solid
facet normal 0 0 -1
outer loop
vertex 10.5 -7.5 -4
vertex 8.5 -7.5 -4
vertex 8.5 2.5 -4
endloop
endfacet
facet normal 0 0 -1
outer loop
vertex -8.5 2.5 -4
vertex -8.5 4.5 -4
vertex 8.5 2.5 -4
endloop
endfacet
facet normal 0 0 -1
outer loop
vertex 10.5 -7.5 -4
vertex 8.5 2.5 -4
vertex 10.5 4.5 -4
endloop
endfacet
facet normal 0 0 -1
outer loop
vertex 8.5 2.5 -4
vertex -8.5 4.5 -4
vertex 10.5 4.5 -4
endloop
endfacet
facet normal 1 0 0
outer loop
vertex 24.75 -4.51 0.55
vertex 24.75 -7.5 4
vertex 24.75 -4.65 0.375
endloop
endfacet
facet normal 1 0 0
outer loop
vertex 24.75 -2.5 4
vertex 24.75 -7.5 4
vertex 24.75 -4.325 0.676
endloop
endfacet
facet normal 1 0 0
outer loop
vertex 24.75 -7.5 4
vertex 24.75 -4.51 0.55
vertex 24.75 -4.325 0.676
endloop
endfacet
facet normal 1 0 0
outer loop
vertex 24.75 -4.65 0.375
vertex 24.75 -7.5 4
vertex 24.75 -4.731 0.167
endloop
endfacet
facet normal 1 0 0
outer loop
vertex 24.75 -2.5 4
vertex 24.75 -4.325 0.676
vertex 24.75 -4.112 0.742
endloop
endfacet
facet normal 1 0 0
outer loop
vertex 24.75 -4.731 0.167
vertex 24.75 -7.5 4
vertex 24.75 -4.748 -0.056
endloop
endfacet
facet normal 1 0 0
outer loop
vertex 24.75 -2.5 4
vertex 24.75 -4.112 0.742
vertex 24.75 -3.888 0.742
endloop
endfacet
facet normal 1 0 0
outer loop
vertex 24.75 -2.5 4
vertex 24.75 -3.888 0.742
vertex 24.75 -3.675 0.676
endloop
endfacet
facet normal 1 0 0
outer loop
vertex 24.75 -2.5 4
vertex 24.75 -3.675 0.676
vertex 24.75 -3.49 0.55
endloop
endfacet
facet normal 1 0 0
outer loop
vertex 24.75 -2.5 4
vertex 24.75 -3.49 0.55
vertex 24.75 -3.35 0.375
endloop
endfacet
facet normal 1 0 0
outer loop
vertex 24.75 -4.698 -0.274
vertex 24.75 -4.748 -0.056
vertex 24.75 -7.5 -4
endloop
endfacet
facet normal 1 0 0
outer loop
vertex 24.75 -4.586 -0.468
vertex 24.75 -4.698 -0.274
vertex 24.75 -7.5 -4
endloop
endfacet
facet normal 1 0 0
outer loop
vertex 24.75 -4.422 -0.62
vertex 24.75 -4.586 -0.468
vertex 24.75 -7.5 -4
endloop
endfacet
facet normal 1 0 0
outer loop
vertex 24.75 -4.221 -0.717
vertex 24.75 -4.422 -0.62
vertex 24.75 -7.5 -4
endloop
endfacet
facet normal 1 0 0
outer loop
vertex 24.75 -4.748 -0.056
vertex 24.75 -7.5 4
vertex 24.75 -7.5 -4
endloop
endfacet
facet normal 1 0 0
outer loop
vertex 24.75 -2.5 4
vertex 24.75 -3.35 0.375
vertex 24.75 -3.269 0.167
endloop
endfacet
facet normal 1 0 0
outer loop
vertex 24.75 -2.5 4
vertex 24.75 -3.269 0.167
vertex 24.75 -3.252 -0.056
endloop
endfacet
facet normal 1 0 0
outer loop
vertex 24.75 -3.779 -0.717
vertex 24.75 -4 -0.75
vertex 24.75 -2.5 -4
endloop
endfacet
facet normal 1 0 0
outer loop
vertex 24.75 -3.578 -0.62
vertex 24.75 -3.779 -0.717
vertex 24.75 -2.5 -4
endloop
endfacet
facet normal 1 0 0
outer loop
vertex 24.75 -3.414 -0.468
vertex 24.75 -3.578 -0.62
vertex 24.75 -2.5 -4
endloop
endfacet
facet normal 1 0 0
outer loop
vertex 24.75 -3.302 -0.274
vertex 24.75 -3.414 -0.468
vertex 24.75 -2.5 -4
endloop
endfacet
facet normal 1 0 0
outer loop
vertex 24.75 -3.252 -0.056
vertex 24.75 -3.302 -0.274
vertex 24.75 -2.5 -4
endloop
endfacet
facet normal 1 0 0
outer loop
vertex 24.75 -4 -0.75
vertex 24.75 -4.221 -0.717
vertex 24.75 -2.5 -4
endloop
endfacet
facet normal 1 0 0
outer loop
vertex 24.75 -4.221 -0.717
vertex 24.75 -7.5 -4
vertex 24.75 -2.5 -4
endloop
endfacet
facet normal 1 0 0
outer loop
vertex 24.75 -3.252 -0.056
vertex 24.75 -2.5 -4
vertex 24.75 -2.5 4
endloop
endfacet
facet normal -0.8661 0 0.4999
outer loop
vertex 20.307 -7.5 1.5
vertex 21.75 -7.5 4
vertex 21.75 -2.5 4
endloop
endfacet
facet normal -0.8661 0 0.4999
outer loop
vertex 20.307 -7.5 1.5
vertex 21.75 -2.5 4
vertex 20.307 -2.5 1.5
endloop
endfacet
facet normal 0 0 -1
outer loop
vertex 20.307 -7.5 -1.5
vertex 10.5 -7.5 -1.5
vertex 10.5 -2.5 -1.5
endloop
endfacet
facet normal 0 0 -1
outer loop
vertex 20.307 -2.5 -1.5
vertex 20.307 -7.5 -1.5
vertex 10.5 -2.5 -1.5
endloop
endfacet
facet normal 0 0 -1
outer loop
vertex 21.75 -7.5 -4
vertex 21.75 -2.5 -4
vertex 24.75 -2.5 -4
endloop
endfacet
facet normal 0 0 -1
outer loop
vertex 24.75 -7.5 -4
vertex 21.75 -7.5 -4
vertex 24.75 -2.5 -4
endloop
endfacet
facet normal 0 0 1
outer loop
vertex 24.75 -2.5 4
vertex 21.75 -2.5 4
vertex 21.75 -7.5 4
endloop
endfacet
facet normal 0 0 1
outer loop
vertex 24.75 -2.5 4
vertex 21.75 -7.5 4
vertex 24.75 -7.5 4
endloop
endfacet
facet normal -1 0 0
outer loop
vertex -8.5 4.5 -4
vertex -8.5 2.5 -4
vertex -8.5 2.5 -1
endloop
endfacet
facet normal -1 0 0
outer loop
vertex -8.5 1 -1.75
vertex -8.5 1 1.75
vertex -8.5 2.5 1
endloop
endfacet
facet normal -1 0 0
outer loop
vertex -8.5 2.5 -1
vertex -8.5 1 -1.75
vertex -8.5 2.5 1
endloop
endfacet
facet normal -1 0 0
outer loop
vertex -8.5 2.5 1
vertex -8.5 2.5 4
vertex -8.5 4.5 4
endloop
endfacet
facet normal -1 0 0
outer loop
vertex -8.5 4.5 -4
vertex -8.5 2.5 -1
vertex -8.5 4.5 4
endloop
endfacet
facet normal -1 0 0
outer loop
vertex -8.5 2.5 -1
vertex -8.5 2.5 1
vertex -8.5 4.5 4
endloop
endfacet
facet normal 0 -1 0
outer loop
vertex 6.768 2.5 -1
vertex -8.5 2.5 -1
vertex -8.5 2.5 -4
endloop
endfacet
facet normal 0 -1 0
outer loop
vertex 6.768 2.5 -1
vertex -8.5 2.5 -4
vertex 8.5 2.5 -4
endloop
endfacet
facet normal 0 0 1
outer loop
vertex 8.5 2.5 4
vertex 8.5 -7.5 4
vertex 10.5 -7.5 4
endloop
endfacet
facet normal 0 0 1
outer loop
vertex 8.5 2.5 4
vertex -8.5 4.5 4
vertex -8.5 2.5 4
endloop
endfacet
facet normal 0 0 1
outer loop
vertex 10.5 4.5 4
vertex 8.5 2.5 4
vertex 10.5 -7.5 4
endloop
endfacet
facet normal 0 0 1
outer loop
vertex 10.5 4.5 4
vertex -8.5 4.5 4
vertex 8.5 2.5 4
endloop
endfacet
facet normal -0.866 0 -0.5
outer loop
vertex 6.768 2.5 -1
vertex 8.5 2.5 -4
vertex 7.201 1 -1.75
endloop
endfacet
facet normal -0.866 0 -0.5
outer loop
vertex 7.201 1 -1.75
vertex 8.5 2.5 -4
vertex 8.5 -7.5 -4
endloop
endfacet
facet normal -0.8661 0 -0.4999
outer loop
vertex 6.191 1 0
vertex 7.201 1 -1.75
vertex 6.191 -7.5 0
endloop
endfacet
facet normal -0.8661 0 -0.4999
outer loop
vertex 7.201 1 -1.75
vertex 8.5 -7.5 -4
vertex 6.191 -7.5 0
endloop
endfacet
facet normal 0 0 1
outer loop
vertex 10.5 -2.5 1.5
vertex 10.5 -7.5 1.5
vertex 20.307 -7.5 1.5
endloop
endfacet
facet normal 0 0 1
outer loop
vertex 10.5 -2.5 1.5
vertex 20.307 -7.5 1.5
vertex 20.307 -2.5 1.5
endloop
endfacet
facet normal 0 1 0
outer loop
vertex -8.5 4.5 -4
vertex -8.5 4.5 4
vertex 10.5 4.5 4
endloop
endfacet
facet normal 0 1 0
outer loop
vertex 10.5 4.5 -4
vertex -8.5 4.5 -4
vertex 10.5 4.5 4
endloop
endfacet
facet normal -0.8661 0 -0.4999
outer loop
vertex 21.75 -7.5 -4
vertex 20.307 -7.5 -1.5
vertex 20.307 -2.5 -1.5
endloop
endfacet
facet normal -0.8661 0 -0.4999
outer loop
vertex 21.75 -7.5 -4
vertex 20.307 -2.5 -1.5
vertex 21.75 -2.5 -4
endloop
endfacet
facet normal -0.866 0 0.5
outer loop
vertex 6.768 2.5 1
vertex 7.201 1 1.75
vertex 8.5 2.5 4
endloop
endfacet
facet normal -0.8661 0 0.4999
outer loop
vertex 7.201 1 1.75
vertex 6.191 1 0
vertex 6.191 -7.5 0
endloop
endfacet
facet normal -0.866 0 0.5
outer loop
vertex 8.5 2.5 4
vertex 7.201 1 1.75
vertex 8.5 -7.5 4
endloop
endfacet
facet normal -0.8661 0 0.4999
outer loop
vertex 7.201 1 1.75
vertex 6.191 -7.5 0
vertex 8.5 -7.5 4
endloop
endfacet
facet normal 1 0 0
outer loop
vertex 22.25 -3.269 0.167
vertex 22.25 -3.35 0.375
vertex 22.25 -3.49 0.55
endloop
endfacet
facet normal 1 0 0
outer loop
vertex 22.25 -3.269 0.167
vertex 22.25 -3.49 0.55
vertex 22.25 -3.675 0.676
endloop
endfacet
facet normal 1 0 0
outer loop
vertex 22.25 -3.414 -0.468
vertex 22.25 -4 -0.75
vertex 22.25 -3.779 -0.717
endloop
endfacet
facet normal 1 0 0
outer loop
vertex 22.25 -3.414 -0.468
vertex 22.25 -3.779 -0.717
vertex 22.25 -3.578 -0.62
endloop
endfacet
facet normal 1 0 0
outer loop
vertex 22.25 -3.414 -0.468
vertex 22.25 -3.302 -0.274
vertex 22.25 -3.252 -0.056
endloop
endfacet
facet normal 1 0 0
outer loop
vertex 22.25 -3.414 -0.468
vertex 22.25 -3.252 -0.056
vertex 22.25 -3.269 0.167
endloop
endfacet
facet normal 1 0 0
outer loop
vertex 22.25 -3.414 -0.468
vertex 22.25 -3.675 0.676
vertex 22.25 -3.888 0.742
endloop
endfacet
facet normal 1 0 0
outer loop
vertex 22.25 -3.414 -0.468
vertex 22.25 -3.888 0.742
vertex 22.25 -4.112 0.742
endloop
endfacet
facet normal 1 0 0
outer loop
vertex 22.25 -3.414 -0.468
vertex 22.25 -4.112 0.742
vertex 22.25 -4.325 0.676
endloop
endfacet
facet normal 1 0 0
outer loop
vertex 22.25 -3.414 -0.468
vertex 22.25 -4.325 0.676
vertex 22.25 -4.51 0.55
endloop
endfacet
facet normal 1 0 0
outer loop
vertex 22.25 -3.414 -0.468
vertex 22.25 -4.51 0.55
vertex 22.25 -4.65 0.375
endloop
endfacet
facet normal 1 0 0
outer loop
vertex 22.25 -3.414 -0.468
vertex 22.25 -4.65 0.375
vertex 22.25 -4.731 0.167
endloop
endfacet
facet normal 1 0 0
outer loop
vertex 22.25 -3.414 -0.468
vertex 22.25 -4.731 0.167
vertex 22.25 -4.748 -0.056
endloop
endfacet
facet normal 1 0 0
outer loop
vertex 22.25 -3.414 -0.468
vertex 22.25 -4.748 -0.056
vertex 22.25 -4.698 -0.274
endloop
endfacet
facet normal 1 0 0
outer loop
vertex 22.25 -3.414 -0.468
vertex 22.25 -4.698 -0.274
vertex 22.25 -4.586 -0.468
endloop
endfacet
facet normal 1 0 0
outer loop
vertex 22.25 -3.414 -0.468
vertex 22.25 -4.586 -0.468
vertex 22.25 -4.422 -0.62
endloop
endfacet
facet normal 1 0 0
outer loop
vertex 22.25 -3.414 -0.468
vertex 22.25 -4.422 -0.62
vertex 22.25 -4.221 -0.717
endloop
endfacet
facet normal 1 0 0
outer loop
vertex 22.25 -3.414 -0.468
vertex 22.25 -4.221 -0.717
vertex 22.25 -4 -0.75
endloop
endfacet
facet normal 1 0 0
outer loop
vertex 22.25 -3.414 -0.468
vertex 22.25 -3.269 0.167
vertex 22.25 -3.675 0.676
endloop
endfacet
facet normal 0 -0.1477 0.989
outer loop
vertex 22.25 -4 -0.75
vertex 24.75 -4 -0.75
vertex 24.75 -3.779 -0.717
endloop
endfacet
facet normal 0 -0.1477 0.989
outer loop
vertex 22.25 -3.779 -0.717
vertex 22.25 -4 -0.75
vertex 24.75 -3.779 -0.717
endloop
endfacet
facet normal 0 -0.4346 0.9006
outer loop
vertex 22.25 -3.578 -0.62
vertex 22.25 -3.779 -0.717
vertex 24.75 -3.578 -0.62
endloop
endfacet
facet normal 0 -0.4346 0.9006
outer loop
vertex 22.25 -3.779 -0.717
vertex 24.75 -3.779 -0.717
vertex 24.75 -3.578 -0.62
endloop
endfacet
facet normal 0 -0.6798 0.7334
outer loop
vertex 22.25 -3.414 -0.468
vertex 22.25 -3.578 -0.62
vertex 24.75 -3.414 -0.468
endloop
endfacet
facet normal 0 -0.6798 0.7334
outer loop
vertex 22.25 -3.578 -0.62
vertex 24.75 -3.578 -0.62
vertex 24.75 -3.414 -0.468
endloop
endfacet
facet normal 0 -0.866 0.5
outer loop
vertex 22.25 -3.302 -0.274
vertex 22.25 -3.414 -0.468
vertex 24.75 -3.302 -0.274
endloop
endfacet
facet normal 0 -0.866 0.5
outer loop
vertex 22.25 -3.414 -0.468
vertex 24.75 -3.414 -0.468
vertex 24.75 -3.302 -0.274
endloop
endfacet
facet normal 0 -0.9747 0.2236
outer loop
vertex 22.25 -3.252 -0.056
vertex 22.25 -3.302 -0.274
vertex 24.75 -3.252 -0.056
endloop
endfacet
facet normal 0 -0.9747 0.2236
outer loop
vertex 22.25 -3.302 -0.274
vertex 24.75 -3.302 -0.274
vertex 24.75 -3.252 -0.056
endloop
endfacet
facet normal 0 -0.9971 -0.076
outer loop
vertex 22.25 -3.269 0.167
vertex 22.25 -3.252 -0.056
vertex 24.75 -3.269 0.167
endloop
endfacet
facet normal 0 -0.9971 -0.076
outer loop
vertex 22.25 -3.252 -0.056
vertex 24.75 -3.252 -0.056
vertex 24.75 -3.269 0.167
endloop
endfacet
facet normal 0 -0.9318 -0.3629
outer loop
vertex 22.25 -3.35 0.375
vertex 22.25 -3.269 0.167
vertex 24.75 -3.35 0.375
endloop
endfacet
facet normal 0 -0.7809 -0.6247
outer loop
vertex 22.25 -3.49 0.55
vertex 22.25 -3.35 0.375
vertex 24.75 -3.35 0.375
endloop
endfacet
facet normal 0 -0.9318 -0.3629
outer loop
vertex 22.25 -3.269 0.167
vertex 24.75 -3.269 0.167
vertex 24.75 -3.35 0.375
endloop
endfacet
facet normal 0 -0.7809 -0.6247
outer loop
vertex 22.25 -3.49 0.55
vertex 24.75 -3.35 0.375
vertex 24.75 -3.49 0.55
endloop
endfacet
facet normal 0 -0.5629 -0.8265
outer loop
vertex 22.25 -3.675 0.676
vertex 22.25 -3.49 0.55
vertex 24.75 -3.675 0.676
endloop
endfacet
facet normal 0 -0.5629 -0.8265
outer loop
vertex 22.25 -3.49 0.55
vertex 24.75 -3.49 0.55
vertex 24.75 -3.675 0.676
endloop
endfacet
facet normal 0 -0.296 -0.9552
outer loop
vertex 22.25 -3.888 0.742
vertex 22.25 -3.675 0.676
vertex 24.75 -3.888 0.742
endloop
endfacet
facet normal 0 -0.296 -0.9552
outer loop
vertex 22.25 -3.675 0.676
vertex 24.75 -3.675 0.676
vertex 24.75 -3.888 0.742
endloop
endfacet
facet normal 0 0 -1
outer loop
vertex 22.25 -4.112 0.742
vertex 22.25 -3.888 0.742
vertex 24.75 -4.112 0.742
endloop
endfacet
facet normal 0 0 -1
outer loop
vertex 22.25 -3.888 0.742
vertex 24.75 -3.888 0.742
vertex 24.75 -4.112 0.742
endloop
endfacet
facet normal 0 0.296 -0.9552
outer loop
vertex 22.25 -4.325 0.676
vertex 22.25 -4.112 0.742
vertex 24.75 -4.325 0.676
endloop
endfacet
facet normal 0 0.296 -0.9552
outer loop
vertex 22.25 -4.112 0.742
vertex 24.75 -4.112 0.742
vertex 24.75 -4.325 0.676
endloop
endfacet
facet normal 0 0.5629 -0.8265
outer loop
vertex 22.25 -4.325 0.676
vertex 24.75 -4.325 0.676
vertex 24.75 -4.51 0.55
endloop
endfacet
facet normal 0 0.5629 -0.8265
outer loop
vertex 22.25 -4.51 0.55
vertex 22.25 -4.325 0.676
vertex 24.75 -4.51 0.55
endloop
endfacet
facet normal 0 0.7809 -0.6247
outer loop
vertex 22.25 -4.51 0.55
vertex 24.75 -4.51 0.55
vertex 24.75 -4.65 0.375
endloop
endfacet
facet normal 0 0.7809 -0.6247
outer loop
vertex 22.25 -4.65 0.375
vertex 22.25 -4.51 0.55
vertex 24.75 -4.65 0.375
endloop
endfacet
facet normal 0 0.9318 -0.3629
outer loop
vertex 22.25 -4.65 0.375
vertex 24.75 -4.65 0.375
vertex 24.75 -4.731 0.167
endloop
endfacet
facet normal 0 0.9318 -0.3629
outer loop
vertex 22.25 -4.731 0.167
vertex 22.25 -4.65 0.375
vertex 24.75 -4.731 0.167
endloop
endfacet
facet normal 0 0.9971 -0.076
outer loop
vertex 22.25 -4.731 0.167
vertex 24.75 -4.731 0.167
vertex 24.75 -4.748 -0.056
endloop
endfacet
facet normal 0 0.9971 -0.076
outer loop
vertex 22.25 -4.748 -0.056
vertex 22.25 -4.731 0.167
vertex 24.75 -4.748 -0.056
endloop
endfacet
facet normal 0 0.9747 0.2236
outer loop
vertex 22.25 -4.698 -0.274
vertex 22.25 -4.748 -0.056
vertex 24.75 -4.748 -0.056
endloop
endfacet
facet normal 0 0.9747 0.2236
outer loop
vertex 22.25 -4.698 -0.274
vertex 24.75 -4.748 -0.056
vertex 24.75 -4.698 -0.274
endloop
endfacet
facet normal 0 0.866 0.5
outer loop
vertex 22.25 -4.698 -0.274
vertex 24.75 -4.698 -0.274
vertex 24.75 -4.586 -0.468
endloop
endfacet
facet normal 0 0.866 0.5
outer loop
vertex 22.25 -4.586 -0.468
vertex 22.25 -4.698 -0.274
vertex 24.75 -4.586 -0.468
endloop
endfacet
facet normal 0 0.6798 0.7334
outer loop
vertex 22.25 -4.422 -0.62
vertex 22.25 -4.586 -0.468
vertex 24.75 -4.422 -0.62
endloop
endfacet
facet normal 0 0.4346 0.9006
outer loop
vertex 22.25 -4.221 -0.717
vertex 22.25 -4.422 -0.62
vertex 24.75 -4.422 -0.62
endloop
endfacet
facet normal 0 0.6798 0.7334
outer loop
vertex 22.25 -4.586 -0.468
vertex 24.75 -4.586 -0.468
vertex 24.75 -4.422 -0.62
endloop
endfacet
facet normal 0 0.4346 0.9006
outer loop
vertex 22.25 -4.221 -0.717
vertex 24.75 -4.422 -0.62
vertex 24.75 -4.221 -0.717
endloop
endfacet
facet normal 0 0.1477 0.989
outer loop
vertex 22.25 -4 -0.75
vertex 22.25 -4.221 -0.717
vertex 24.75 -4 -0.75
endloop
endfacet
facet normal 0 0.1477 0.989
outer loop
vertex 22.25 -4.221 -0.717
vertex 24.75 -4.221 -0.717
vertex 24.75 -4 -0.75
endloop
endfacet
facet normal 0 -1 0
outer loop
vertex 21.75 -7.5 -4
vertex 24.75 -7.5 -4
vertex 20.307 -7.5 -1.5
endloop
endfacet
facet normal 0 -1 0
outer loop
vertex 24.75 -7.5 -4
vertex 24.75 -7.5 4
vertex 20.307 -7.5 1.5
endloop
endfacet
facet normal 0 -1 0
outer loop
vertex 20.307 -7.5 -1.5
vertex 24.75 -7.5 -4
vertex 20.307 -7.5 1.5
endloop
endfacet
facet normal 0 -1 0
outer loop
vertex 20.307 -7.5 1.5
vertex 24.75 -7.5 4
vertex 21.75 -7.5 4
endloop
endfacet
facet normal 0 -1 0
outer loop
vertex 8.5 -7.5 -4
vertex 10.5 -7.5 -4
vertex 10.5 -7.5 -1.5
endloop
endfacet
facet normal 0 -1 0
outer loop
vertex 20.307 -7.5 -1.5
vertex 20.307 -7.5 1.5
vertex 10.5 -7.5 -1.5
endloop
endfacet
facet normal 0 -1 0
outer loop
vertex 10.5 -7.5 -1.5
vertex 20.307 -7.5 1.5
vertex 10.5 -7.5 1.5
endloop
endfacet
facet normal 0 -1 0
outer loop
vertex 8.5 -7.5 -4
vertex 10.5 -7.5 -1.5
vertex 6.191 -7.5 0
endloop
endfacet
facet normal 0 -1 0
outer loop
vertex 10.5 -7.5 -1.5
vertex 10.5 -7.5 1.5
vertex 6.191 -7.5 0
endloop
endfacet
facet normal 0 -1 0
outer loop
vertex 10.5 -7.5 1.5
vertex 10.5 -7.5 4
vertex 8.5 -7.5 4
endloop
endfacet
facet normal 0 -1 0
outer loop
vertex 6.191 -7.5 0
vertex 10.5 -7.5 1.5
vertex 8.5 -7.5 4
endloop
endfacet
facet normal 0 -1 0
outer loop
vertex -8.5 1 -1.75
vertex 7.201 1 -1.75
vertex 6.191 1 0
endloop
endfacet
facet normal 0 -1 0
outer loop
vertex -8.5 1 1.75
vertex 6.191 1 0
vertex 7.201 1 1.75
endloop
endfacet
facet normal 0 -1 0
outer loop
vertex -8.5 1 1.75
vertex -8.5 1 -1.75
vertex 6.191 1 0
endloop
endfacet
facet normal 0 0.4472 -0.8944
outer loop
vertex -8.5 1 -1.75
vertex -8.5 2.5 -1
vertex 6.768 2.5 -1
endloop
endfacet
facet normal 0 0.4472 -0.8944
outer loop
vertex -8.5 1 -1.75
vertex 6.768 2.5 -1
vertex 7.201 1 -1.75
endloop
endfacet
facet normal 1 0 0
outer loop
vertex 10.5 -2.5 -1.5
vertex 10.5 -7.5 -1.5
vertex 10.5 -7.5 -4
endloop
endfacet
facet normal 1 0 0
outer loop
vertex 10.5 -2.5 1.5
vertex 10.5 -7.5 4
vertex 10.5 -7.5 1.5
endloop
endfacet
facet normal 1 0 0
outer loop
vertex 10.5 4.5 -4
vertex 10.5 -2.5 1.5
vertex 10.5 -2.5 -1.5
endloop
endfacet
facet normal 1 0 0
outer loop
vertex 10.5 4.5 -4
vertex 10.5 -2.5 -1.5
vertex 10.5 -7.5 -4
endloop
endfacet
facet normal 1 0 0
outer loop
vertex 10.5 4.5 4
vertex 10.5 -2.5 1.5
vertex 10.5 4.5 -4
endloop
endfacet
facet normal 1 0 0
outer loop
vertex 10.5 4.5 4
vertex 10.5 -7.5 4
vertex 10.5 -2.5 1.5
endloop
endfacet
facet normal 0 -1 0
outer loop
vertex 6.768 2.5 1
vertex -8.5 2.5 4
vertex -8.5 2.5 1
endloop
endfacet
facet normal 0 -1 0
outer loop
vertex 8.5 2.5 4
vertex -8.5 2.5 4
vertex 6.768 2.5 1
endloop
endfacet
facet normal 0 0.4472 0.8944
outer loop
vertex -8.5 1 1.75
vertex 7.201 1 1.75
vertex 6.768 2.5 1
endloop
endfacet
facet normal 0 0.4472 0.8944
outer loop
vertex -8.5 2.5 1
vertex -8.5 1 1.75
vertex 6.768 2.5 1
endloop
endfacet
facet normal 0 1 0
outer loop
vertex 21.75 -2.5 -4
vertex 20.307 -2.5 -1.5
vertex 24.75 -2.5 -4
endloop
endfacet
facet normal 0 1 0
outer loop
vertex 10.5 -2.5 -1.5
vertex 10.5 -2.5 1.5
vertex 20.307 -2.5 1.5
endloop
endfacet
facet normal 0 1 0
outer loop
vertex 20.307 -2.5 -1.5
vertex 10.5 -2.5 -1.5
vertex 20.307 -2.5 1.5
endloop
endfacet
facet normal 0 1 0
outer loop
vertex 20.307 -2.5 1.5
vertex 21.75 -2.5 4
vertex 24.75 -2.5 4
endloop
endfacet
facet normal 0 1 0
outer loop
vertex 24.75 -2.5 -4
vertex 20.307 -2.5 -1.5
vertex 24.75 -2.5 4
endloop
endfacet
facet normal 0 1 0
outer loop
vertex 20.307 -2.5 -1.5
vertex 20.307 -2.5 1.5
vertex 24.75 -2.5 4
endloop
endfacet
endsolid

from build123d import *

# Parameters (mm, degrees)
SKETCH1_W               = 21
SKETCH1_H               = 9
BOSS_EXTRUDE1_DEPTH     = 4
CUT_EXTRUDE1_REACH      = 15.946
SKETCH2_W               = 17
SKETCH2_H               = 7
CUT_EXTRUDE3_REACH      = 15.946
SKETCH5_W               = 2
SKETCH5_H               = 9
BOSS_EXTRUDE2_REACH     = 21.931
SKETCH9_W               = 2
SKETCH9_H               = 3
BOSS_EXTRUDE3_DEPTH     = 8
SKETCH11_W              = 3
SKETCH11_H              = 5
BOSS_EXTRUDE4_DEPTH     = 11.25
BOSS_EXTRUDE5_START     = -4
BOSS_EXTRUDE5_OUTLINE_W = 3
BOSS_EXTRUDE5_OUTLINE_H = 5
BOSS_EXTRUDE5_DEPTH     = 8
SKETCH13_R              = 0.75
CUT_EXTRUDE4_DEPTH      = 2.5
BOSS_EXTRUDE6_DEPTH     = 5
BOSS_EXTRUDE7_REACH     = 29.795


# Read off the part's stored shape, not the designer's step: Boss-Extrude5
with BuildPart() as part:
    # Sketch1 → Boss-Extrude1 (new, symmetric)
    with BuildSketch(Plane.XY):
        Rectangle(SKETCH1_W, SKETCH1_H)
    extrude(amount=BOSS_EXTRUDE1_DEPTH, both=True)

    # Sketch2 → Cut-Extrude1 (cut, up to next)
    with BuildSketch(Plane.XY.offset(4), mode=Mode.PRIVATE) as cut_extrude1_sk1:
        with Locations((0, -1)):
            Rectangle(SKETCH2_W, SKETCH2_H)
    cut_extrude1_tool1 = extrude(cut_extrude1_sk1.sketch, amount=-CUT_EXTRUDE1_REACH, mode=Mode.PRIVATE) & part.part
    add(cut_extrude1_tool1.solids().sort_by_distance((0, -1, 4))[0], mode=Mode.SUBTRACT)

    # Sketch5 → Cut-Extrude3 (cut, up to next)
    with BuildSketch(Plane.XY.offset(4), mode=Mode.PRIVATE) as cut_extrude3_sk1:
        with Locations((-9.5, 0)):
            Rectangle(SKETCH5_W, SKETCH5_H)
    cut_extrude3_tool1 = extrude(cut_extrude3_sk1.sketch, amount=-CUT_EXTRUDE3_REACH, mode=Mode.PRIVATE) & part.part
    add(cut_extrude3_tool1.solids().sort_by_distance((-9.5, 0, 4))[0], mode=Mode.SUBTRACT)

    # Sketch7 → Boss-Extrude2 (add, up to next)
    with BuildSketch(Plane.ZY.offset(8.5), mode=Mode.PRIVATE) as boss_extrude2_sk1:
        Polygon((1, 2.5), (-1, 2.5), (-1.75, 1), (1.75, 1), align=None)
    boss_extrude2_tool1 = extrude(boss_extrude2_sk1.sketch, amount=-BOSS_EXTRUDE2_REACH, mode=Mode.PRIVATE) - part.part
    add(boss_extrude2_tool1.solids().sort_by_distance((-8.5, 1.681818, 0))[0])

    # Sketch9 → Boss-Extrude3 (add)
    with BuildSketch(Plane.XY.offset(4)):
        with Locations((9.5, -6)):
            Rectangle(SKETCH9_W, SKETCH9_H)
    extrude(amount=-BOSS_EXTRUDE3_DEPTH)

    # Sketch11 → Boss-Extrude4 (add)
    with BuildSketch(Plane(origin=(10.5, 0, 0), x_dir=(0, 0, -1), z_dir=(1, 0, 0))):
        with Locations((0, -5)):
            Rectangle(SKETCH11_W, SKETCH11_H)
    extrude(amount=BOSS_EXTRUDE4_DEPTH)

    # Boss-Extrude5 outline → Boss-Extrude5 (add)
    with BuildSketch(Plane.XY.offset(BOSS_EXTRUDE5_START)):
        with Locations((23.25, -5)):
            Rectangle(BOSS_EXTRUDE5_OUTLINE_W, BOSS_EXTRUDE5_OUTLINE_H)
    extrude(amount=BOSS_EXTRUDE5_DEPTH)

    # Sketch13 → Cut-Extrude4 (cut)
    with BuildSketch(Plane(origin=(24.75, 0, 0), x_dir=(0, 0, -1), z_dir=(1, 0, 0))):
        with Locations((0, -4)):
            Circle(SKETCH13_R)
    extrude(amount=-CUT_EXTRUDE4_DEPTH, mode=Mode.SUBTRACT)

    # Sketch14 → Boss-Extrude6 (add)
    with BuildSketch(Plane.XZ.offset(7.5)):
        Polygon((21.75, 4), (20.306624327, 1.5), (21.75, 1.5), align=None)
        Polygon((21.75, -4), (21.75, -1.5), (20.306624327, -1.5), align=None)
    extrude(amount=-BOSS_EXTRUDE6_DEPTH)

    # Boss-Extrude7: up to this face of the body (flat: up to its plane)
    boss_extrude7_end = Plane(part.part.faces().sort_by_distance((1, 4.5, 0))[0])
    # Sketch15 → Boss-Extrude7 (add, up to the picked face)
    with BuildSketch(Plane.XZ.offset(7.5), mode=Mode.PRIVATE) as boss_extrude7_sk1:
        Polygon((8.5, 4), (8.5, -4), (6.190598923, 0), align=None)
    boss_extrude7_tool1 = split(extrude(boss_extrude7_sk1.sketch, amount=-BOSS_EXTRUDE7_REACH, mode=Mode.PRIVATE), bisect_by=boss_extrude7_end, keep=Keep.BOTH, mode=Mode.PRIVATE)
    add(boss_extrude7_tool1.solids().sort_by(Axis((7.7302, -7.5, 0), (0, 1, 0)))[0])


solid = part.part
